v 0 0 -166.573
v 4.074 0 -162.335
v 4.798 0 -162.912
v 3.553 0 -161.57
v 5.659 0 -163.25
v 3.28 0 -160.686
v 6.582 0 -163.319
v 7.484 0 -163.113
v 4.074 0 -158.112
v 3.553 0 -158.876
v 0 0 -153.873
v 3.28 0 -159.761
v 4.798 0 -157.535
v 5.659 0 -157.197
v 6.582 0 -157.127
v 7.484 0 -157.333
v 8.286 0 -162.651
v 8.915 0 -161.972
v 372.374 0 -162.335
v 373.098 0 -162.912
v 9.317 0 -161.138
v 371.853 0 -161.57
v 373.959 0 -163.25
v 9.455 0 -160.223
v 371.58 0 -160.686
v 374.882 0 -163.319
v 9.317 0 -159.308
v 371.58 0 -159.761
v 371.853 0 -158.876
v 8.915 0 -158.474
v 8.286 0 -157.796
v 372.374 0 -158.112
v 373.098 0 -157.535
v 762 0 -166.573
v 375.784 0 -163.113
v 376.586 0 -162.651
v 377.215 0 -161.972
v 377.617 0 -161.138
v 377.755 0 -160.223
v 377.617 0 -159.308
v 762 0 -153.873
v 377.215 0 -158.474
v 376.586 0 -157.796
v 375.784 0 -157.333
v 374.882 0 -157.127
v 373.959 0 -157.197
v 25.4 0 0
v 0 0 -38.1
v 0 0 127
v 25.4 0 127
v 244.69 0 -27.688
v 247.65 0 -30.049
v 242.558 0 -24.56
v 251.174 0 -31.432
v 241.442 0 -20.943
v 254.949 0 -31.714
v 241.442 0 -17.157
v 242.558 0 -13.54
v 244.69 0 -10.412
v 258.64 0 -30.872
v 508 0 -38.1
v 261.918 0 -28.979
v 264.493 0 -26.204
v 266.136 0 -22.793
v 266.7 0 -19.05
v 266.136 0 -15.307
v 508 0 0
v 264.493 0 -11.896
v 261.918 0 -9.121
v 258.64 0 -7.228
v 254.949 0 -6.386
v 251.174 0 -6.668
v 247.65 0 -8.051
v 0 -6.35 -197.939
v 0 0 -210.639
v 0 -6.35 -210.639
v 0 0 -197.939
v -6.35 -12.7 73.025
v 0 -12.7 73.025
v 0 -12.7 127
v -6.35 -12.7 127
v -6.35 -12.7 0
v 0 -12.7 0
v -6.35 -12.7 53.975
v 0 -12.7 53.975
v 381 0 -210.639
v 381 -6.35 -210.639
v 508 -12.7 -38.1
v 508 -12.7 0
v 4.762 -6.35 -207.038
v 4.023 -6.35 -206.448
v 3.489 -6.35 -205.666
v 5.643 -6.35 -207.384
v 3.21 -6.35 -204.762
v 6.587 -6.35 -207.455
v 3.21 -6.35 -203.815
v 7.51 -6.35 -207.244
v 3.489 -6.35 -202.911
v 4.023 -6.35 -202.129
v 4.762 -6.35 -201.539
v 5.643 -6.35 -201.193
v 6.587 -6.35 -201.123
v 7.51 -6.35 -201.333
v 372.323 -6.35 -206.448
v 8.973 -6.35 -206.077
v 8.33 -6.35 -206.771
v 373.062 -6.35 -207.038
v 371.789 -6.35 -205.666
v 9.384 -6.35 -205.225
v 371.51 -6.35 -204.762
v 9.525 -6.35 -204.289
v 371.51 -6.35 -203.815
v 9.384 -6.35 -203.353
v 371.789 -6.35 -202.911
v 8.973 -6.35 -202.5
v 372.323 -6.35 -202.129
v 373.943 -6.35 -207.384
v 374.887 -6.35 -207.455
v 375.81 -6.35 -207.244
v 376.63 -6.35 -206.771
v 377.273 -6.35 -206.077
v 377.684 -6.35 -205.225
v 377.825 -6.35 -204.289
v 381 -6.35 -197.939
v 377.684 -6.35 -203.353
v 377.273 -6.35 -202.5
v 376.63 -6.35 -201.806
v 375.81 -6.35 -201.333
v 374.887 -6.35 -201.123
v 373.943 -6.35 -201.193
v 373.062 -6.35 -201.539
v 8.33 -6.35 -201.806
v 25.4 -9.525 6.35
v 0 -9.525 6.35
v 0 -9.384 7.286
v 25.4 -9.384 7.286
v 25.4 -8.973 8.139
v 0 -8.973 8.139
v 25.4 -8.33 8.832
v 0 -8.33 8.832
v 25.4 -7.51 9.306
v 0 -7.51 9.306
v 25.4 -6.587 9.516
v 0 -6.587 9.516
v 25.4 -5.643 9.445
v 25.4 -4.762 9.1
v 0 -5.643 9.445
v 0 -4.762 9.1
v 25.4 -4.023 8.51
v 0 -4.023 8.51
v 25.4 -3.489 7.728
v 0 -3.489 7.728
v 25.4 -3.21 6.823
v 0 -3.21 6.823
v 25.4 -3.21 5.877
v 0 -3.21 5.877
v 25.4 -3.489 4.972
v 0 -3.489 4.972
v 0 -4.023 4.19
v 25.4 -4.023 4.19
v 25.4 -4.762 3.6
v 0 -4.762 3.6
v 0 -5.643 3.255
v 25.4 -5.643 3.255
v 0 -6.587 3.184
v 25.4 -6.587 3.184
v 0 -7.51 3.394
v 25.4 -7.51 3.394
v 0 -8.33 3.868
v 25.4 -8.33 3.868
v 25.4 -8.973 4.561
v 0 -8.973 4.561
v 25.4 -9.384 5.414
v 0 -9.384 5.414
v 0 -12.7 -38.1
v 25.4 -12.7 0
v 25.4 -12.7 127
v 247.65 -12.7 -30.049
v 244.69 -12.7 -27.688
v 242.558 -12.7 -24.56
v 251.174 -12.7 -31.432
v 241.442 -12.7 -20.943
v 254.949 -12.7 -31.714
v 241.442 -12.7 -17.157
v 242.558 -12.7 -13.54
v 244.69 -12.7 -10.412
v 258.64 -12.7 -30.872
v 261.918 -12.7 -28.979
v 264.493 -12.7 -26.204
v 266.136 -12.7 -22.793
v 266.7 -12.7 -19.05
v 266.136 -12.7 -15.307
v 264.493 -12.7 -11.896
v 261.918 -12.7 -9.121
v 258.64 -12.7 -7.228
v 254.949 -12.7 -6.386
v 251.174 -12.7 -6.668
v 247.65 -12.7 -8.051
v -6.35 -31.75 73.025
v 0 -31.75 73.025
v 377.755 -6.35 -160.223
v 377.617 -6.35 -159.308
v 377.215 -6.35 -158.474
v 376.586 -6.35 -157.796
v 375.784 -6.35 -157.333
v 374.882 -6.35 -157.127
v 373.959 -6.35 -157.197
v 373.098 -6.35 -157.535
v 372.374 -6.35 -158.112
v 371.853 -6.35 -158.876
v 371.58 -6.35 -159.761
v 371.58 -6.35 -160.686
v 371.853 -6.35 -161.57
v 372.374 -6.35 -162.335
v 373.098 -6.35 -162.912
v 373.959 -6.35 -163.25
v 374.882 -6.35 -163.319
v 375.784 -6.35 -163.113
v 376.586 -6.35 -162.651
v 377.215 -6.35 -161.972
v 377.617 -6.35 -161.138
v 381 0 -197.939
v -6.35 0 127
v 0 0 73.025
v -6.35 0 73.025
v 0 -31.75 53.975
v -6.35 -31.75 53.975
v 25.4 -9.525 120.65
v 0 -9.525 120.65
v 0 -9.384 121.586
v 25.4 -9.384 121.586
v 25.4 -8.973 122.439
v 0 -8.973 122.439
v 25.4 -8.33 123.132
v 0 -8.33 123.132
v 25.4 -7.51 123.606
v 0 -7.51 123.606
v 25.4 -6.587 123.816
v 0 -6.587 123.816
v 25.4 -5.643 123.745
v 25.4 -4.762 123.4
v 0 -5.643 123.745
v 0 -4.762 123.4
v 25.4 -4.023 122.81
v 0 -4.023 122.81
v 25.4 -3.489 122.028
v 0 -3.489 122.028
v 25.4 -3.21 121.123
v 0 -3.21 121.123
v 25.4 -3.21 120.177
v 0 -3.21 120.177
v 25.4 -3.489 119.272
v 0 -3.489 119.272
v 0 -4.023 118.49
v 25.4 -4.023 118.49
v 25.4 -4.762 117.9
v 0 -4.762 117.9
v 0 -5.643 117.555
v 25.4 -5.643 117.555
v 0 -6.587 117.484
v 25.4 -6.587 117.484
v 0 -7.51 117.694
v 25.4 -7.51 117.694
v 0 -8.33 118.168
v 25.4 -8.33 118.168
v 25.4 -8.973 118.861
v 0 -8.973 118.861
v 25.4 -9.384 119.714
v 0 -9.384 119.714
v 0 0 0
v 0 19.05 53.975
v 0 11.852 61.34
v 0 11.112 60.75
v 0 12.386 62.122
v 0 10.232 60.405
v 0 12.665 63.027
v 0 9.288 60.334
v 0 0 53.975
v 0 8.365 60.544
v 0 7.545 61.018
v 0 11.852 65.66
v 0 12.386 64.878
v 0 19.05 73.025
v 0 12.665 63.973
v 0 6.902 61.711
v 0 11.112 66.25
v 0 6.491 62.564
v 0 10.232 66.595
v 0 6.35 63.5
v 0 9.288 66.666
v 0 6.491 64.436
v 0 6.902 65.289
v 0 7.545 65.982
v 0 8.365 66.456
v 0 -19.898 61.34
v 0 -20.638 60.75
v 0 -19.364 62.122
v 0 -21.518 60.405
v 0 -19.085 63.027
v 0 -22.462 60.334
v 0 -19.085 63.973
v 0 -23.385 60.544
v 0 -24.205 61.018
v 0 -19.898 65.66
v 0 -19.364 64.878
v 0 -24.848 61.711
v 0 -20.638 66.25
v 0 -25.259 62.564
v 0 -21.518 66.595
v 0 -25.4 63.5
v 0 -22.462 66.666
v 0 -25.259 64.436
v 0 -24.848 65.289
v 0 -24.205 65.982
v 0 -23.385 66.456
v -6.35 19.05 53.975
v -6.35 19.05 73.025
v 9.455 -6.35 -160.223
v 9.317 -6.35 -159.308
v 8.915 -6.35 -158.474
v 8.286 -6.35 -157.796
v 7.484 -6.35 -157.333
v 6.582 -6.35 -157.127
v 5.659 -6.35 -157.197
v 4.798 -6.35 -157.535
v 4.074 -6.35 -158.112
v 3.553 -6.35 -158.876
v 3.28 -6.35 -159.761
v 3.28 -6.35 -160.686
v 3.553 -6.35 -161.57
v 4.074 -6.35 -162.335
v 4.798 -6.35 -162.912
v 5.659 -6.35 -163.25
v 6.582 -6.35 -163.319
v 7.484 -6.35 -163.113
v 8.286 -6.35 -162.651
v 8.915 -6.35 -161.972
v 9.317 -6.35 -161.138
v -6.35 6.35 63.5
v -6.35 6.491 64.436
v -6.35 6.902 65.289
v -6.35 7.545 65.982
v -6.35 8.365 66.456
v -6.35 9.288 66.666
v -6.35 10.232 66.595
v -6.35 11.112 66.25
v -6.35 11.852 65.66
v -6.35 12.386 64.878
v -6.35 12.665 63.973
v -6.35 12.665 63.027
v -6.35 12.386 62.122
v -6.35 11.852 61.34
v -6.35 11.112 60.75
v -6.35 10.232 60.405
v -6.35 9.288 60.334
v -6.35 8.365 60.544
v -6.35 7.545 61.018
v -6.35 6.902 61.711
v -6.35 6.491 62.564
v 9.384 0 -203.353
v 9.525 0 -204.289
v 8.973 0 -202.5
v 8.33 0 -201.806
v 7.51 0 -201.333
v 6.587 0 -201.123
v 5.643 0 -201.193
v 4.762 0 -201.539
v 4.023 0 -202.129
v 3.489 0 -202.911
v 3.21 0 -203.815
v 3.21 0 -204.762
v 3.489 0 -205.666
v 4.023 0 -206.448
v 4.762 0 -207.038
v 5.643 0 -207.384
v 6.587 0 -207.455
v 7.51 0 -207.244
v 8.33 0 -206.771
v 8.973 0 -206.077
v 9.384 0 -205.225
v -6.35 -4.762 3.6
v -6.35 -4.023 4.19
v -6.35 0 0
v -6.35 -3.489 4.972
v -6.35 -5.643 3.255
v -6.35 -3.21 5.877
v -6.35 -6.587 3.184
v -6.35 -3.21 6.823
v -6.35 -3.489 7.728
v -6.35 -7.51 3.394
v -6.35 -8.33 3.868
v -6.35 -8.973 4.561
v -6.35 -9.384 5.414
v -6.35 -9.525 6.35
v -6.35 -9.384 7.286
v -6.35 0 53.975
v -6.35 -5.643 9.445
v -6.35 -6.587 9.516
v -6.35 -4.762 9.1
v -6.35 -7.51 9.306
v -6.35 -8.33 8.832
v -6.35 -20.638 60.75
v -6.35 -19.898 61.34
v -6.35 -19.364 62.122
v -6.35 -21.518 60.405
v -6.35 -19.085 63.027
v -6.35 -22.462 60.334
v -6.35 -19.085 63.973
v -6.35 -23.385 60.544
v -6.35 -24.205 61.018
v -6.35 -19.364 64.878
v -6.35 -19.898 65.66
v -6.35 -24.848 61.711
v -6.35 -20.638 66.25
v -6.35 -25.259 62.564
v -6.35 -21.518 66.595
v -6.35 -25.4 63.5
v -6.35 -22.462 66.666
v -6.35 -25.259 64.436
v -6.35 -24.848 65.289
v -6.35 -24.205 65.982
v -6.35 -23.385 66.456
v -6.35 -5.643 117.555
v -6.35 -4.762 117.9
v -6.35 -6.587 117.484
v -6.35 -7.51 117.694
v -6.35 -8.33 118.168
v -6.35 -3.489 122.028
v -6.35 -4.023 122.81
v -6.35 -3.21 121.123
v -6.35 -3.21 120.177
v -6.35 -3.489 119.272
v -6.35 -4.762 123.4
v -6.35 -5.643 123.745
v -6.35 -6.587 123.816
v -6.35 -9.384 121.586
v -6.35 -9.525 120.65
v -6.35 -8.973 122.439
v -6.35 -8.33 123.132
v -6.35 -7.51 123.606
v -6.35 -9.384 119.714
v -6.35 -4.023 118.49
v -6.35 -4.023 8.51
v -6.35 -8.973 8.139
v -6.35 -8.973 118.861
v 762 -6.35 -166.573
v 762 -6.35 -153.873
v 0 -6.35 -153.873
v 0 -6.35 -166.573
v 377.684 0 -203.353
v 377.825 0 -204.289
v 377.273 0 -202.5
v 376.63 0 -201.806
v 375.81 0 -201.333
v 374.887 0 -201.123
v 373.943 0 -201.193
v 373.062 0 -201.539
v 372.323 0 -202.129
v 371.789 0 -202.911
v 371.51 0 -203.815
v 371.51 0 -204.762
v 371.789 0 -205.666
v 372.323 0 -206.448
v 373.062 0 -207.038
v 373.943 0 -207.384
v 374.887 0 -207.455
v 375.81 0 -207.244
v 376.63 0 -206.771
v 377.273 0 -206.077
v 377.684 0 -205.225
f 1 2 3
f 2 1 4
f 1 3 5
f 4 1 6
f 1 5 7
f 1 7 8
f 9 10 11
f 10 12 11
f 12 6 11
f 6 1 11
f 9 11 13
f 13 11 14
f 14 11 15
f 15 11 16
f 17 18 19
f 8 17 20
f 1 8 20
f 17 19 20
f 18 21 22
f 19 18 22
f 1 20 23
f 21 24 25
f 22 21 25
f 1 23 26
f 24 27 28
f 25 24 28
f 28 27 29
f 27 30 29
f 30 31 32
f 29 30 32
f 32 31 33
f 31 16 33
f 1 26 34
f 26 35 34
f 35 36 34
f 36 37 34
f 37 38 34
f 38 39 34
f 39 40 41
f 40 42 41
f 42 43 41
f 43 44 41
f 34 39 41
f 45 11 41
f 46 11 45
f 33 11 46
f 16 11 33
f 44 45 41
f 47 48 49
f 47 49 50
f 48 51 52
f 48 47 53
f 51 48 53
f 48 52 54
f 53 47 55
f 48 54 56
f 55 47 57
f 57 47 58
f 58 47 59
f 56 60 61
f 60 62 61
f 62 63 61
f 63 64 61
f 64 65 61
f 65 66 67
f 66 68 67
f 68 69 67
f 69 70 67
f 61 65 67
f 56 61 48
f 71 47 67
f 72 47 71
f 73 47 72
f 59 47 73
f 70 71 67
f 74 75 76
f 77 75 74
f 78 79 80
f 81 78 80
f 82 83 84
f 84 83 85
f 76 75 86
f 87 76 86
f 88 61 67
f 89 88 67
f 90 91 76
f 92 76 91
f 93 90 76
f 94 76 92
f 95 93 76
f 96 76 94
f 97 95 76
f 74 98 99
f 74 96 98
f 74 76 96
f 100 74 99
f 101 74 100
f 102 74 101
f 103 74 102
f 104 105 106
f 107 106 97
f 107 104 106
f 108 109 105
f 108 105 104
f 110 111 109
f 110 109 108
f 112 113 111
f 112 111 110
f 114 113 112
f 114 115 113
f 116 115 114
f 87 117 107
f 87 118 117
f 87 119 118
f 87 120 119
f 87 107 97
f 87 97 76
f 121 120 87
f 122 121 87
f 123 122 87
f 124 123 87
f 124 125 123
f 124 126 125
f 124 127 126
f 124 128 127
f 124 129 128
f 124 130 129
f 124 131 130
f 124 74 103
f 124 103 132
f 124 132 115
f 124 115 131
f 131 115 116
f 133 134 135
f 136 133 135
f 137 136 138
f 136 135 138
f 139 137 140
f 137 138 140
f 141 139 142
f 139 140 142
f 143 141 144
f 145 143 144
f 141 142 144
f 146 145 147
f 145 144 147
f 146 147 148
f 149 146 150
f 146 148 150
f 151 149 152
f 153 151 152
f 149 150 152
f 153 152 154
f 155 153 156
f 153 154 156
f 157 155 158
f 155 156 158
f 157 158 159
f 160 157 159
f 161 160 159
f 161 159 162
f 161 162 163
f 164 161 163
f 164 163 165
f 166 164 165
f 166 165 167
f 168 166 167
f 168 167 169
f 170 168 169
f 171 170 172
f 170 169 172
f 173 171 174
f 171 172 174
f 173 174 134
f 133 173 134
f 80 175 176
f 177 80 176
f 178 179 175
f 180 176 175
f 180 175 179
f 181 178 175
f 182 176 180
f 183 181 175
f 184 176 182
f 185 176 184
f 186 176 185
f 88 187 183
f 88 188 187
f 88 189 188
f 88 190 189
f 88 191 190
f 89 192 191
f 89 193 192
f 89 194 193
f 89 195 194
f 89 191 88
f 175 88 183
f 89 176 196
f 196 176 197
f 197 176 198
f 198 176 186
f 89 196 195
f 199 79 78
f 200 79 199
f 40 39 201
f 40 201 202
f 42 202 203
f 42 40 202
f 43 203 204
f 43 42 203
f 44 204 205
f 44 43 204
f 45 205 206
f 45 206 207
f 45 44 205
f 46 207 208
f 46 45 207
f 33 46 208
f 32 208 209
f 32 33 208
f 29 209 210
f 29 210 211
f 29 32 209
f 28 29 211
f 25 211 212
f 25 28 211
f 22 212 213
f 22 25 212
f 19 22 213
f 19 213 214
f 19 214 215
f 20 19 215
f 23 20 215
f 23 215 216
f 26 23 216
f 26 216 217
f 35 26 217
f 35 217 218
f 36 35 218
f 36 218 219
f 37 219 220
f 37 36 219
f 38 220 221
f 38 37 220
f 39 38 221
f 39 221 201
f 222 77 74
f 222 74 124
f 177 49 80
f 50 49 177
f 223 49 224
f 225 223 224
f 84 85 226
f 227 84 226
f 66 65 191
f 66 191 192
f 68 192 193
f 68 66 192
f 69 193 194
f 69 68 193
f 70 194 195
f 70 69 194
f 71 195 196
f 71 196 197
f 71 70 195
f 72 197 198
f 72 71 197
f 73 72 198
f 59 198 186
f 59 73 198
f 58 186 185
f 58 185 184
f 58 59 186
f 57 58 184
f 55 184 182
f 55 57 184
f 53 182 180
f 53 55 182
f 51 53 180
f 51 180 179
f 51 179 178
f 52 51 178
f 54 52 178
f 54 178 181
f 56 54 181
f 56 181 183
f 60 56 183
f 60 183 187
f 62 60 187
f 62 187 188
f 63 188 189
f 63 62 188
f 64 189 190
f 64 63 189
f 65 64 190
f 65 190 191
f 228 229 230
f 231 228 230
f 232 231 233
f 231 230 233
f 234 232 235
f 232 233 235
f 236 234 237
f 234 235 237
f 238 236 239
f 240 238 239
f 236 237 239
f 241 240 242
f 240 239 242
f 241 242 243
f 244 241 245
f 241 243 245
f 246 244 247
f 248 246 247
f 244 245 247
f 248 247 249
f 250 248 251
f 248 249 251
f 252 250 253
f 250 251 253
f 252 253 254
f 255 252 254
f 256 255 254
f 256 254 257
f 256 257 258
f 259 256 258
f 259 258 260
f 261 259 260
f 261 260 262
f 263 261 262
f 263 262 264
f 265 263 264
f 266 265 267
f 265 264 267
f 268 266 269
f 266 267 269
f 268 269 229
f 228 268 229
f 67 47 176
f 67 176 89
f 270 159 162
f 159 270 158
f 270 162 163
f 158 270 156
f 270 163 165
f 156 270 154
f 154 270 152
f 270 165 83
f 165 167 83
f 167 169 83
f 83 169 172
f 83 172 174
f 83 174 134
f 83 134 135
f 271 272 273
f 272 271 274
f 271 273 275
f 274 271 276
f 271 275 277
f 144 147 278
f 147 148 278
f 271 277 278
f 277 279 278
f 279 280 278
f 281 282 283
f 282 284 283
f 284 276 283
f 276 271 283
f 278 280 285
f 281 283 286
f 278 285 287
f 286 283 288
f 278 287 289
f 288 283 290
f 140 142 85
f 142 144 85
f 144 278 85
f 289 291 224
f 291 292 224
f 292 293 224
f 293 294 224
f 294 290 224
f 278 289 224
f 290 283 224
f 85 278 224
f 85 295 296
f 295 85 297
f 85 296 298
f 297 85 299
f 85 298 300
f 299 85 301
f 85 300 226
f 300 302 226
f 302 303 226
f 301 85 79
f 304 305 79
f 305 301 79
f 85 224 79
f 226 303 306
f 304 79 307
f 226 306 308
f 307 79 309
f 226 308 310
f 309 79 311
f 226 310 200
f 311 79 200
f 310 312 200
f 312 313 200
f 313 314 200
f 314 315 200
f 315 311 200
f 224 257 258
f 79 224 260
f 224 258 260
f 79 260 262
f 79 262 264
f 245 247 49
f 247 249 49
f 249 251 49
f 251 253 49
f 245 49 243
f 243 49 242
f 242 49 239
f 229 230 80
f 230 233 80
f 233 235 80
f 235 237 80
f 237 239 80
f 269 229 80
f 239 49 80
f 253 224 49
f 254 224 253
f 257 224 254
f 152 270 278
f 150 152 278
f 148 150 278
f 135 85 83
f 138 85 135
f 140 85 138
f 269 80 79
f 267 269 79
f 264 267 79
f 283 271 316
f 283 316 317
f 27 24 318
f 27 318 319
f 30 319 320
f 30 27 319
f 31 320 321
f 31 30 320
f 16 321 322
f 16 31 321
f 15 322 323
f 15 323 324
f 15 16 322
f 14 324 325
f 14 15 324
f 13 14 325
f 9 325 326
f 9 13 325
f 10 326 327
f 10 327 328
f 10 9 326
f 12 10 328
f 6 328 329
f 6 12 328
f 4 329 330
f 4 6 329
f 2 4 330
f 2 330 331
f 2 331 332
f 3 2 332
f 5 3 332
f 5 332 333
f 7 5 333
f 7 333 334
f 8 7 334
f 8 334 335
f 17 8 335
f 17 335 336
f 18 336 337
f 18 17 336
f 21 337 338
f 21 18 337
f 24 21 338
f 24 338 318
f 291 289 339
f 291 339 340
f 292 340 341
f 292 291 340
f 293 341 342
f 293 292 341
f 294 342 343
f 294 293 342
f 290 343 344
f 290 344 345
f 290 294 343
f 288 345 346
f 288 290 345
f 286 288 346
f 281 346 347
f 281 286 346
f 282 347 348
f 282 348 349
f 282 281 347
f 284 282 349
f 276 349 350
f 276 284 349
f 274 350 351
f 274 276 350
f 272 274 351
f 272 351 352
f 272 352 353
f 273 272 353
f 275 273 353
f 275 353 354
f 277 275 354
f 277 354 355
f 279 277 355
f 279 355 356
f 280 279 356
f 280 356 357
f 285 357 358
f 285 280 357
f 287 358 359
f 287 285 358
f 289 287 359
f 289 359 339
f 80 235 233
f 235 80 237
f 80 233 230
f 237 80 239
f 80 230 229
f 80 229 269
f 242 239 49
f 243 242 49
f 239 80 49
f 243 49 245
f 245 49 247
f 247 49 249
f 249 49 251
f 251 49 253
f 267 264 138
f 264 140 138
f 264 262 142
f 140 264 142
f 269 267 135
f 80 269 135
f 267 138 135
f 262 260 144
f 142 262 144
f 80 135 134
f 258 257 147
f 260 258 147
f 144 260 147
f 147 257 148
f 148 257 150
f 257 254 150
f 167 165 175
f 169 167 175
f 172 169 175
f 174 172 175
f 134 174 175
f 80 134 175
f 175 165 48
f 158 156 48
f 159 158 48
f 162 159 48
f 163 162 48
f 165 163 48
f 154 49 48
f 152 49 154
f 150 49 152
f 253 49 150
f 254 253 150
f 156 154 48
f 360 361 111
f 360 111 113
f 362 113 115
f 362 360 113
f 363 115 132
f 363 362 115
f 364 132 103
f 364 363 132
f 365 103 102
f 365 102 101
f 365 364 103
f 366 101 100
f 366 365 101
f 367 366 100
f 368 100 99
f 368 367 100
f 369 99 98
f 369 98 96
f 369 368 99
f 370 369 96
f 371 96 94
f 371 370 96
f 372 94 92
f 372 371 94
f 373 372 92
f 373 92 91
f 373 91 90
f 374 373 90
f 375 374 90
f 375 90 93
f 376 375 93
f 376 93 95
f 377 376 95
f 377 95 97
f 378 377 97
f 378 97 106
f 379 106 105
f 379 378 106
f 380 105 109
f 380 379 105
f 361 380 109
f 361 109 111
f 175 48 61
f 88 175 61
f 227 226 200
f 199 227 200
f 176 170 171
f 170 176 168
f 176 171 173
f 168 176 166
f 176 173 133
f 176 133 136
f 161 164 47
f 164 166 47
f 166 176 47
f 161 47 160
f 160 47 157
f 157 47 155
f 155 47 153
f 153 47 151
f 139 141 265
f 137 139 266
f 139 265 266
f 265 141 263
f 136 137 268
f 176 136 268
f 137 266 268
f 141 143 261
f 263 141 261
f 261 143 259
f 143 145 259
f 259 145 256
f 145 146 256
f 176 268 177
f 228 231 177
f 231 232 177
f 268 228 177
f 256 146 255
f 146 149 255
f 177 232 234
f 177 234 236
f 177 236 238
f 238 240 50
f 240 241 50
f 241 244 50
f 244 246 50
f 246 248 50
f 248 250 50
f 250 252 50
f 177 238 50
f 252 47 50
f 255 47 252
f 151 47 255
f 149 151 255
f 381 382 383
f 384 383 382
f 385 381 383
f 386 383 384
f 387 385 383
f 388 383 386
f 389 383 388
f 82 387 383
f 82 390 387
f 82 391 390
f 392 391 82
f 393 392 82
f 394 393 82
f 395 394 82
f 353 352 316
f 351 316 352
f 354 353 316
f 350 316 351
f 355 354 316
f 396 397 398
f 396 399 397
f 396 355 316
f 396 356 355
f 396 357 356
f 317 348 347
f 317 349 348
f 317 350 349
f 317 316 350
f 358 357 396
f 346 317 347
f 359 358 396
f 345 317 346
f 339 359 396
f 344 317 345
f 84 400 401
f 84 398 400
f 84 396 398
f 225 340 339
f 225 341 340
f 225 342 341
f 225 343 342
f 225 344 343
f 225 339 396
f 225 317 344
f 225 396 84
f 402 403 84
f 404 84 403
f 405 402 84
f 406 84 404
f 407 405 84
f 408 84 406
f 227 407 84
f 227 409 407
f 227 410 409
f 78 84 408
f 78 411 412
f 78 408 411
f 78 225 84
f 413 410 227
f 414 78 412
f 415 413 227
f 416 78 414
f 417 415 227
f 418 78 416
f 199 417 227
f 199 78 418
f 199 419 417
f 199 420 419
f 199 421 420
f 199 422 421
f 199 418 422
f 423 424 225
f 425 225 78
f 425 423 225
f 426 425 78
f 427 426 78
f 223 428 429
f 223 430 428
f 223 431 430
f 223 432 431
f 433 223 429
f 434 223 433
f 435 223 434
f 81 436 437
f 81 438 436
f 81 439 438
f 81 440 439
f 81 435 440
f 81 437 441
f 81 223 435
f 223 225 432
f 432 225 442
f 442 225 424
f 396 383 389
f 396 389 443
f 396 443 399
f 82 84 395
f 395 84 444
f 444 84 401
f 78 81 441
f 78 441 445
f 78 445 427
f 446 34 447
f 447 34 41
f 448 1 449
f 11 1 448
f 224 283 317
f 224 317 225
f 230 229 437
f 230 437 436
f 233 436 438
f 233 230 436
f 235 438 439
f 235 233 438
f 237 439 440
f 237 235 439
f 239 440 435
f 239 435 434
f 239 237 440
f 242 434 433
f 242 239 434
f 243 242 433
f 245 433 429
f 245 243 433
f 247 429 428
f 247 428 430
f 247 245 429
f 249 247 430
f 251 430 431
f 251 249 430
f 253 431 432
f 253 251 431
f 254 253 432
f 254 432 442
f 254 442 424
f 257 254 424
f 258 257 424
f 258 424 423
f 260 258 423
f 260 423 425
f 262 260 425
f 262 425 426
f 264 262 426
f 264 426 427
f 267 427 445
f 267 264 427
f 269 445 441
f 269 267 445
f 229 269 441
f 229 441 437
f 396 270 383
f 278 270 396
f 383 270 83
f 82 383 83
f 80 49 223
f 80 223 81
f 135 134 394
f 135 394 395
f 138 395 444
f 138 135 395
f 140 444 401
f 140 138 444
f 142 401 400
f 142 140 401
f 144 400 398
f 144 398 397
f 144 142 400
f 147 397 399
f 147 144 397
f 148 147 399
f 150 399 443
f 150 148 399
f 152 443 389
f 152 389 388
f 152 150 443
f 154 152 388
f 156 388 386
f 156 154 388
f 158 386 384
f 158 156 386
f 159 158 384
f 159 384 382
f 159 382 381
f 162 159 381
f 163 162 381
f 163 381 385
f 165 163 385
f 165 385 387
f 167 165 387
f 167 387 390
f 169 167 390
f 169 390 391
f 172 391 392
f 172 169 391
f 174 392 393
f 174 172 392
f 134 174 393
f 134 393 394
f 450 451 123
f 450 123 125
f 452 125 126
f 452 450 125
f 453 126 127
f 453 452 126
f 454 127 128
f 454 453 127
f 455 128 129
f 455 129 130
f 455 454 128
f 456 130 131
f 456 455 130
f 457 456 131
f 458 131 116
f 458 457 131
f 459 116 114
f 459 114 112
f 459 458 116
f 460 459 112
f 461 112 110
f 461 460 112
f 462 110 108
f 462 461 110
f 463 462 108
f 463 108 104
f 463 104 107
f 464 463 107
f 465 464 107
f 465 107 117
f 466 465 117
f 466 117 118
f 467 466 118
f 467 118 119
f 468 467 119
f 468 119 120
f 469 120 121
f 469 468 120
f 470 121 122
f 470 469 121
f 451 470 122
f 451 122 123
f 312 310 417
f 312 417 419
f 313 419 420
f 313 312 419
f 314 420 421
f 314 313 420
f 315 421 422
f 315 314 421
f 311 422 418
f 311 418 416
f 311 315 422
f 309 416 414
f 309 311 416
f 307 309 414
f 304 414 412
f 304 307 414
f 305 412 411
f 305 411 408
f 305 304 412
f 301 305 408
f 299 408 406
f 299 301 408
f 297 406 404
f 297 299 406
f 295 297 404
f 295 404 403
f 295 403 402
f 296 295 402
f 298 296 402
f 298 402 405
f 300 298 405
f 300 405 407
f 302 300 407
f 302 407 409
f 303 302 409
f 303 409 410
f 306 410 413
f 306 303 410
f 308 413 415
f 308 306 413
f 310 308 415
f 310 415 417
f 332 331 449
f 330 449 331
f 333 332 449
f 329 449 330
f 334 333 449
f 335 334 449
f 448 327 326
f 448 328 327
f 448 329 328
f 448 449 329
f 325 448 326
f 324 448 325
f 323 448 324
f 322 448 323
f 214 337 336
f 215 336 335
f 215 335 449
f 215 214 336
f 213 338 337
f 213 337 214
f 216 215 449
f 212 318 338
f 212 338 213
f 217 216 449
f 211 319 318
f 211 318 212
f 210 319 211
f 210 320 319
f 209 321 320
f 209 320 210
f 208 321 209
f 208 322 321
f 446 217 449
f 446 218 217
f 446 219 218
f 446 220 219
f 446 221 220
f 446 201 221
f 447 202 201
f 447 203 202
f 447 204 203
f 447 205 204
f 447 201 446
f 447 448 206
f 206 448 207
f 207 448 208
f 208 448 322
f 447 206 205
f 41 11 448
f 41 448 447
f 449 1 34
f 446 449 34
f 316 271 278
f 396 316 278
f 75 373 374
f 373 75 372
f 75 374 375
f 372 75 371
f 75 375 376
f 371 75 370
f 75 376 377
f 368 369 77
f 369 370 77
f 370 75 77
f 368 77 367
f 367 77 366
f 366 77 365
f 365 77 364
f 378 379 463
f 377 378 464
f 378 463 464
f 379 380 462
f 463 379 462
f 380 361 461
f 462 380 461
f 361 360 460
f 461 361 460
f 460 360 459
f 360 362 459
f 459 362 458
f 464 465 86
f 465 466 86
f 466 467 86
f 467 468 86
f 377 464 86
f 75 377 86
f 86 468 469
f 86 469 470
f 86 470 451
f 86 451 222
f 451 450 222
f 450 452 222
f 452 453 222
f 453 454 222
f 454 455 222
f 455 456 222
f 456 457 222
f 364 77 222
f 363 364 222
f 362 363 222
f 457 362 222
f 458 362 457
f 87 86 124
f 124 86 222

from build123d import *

# Parameters (mm, degrees)
F0_W     = 25.4
F0_H     = 127
F0_H_2   = 38.1
F0_W_2   = 482.6
F0_R     = 12.7
F1_DEPTH = 12.7
F2_R     = 3.175
F3_DEPTH = 25.4
F2_W     = 12.7
F2_H     = 53.975
F2_H_2   = 19.05
F2_W_2   = 19.05
F4_DEPTH = 6.35
F0_W_3   = 762
F0_H_3   = 12.7
F0_R_2   = 3.1045805256
F5_DEPTH = 6.35
F0_W_4   = 381
F0_R_3   = 3.175


with BuildPart() as f1:
    # F0 (on Front) → F1 (new body)
    with BuildSketch(Plane.XZ):
        with Locations((12.7, 63.5)):
            Rectangle(F0_W, F0_H)
        with Locations((12.7, -19.05)):
            Rectangle(F0_W, F0_H_2)
        with Locations((266.7, -19.05)):
            Rectangle(F0_W_2, F0_H_2)
        with Locations((254, -19.05)):
            Circle(F0_R, mode=Mode.SUBTRACT)
    extrude(amount=F1_DEPTH)

    # F2 (on face) → F3 (cut)
    with BuildSketch(Plane(origin=(0, 0, 0), x_dir=(0, -1, 0), z_dir=(-1, 0, 0))):
        with Locations((6.35, 120.65)):
            Circle(F2_R)
        with Locations((6.35, 6.35)):
            Circle(F2_R)
    extrude(amount=-F3_DEPTH, mode=Mode.SUBTRACT)


with BuildPart() as f4:
    # F2 (on face) → F4 (new body)
    with BuildSketch(Plane(origin=(0, 0, 0), x_dir=(0, -1, 0), z_dir=(-1, 0, 0))):
        with Locations((6.35, 100.0125)):
            Rectangle(F2_W, F2_H)
        with Locations((6.35, 120.65)):
            Circle(F2_R, mode=Mode.SUBTRACT)
        with Locations((6.35, 63.5)):
            Rectangle(F2_W, F2_H_2)
        with Locations((-9.525, 63.5)):
            Rectangle(F2_W_2, F2_H_2)
        with Locations((-9.525, 63.5)):
            Circle(F2_R, mode=Mode.SUBTRACT)
        with Locations((22.225, 63.5)):
            Rectangle(F2_W_2, F2_H_2)
        with Locations((22.225, 63.5)):
            Circle(F2_R, mode=Mode.SUBTRACT)
        with Locations((6.35, 26.9875)):
            Rectangle(F2_W, F2_H)
        with Locations((6.35, 6.35)):
            Circle(F2_R, mode=Mode.SUBTRACT)
    extrude(amount=F4_DEPTH)


with BuildPart() as f5:
    # F0 (on Front) → F5 (new body)
    with BuildSketch(Plane.XZ):
        with Locations((381, -160.2233456612)):
            Rectangle(F0_W_3, F0_H_3)
        with Locations((6.35, -160.2233456612)):
            Circle(F0_R_2, mode=Mode.SUBTRACT)
        with Locations((374.65, -160.2233456612)):
            Circle(F0_R_2, mode=Mode.SUBTRACT)
    extrude(amount=F5_DEPTH)


with BuildPart() as f5b:
    # F0 (on Front) → F5, piece 2 (new body)
    with BuildSketch(Plane.XZ):
        with Locations((190.5, -204.2886721134)):
            Rectangle(F0_W_4, F0_H_3)
        with Locations((6.35, -204.2886721134)):
            Circle(F0_R_3, mode=Mode.SUBTRACT)
        with Locations((374.65, -204.2886721134)):
            Circle(F0_R_3, mode=Mode.SUBTRACT)
    extrude(amount=F5_DEPTH)


solid = Compound([f1.part, f4.part, f5.part, f5b.part])
